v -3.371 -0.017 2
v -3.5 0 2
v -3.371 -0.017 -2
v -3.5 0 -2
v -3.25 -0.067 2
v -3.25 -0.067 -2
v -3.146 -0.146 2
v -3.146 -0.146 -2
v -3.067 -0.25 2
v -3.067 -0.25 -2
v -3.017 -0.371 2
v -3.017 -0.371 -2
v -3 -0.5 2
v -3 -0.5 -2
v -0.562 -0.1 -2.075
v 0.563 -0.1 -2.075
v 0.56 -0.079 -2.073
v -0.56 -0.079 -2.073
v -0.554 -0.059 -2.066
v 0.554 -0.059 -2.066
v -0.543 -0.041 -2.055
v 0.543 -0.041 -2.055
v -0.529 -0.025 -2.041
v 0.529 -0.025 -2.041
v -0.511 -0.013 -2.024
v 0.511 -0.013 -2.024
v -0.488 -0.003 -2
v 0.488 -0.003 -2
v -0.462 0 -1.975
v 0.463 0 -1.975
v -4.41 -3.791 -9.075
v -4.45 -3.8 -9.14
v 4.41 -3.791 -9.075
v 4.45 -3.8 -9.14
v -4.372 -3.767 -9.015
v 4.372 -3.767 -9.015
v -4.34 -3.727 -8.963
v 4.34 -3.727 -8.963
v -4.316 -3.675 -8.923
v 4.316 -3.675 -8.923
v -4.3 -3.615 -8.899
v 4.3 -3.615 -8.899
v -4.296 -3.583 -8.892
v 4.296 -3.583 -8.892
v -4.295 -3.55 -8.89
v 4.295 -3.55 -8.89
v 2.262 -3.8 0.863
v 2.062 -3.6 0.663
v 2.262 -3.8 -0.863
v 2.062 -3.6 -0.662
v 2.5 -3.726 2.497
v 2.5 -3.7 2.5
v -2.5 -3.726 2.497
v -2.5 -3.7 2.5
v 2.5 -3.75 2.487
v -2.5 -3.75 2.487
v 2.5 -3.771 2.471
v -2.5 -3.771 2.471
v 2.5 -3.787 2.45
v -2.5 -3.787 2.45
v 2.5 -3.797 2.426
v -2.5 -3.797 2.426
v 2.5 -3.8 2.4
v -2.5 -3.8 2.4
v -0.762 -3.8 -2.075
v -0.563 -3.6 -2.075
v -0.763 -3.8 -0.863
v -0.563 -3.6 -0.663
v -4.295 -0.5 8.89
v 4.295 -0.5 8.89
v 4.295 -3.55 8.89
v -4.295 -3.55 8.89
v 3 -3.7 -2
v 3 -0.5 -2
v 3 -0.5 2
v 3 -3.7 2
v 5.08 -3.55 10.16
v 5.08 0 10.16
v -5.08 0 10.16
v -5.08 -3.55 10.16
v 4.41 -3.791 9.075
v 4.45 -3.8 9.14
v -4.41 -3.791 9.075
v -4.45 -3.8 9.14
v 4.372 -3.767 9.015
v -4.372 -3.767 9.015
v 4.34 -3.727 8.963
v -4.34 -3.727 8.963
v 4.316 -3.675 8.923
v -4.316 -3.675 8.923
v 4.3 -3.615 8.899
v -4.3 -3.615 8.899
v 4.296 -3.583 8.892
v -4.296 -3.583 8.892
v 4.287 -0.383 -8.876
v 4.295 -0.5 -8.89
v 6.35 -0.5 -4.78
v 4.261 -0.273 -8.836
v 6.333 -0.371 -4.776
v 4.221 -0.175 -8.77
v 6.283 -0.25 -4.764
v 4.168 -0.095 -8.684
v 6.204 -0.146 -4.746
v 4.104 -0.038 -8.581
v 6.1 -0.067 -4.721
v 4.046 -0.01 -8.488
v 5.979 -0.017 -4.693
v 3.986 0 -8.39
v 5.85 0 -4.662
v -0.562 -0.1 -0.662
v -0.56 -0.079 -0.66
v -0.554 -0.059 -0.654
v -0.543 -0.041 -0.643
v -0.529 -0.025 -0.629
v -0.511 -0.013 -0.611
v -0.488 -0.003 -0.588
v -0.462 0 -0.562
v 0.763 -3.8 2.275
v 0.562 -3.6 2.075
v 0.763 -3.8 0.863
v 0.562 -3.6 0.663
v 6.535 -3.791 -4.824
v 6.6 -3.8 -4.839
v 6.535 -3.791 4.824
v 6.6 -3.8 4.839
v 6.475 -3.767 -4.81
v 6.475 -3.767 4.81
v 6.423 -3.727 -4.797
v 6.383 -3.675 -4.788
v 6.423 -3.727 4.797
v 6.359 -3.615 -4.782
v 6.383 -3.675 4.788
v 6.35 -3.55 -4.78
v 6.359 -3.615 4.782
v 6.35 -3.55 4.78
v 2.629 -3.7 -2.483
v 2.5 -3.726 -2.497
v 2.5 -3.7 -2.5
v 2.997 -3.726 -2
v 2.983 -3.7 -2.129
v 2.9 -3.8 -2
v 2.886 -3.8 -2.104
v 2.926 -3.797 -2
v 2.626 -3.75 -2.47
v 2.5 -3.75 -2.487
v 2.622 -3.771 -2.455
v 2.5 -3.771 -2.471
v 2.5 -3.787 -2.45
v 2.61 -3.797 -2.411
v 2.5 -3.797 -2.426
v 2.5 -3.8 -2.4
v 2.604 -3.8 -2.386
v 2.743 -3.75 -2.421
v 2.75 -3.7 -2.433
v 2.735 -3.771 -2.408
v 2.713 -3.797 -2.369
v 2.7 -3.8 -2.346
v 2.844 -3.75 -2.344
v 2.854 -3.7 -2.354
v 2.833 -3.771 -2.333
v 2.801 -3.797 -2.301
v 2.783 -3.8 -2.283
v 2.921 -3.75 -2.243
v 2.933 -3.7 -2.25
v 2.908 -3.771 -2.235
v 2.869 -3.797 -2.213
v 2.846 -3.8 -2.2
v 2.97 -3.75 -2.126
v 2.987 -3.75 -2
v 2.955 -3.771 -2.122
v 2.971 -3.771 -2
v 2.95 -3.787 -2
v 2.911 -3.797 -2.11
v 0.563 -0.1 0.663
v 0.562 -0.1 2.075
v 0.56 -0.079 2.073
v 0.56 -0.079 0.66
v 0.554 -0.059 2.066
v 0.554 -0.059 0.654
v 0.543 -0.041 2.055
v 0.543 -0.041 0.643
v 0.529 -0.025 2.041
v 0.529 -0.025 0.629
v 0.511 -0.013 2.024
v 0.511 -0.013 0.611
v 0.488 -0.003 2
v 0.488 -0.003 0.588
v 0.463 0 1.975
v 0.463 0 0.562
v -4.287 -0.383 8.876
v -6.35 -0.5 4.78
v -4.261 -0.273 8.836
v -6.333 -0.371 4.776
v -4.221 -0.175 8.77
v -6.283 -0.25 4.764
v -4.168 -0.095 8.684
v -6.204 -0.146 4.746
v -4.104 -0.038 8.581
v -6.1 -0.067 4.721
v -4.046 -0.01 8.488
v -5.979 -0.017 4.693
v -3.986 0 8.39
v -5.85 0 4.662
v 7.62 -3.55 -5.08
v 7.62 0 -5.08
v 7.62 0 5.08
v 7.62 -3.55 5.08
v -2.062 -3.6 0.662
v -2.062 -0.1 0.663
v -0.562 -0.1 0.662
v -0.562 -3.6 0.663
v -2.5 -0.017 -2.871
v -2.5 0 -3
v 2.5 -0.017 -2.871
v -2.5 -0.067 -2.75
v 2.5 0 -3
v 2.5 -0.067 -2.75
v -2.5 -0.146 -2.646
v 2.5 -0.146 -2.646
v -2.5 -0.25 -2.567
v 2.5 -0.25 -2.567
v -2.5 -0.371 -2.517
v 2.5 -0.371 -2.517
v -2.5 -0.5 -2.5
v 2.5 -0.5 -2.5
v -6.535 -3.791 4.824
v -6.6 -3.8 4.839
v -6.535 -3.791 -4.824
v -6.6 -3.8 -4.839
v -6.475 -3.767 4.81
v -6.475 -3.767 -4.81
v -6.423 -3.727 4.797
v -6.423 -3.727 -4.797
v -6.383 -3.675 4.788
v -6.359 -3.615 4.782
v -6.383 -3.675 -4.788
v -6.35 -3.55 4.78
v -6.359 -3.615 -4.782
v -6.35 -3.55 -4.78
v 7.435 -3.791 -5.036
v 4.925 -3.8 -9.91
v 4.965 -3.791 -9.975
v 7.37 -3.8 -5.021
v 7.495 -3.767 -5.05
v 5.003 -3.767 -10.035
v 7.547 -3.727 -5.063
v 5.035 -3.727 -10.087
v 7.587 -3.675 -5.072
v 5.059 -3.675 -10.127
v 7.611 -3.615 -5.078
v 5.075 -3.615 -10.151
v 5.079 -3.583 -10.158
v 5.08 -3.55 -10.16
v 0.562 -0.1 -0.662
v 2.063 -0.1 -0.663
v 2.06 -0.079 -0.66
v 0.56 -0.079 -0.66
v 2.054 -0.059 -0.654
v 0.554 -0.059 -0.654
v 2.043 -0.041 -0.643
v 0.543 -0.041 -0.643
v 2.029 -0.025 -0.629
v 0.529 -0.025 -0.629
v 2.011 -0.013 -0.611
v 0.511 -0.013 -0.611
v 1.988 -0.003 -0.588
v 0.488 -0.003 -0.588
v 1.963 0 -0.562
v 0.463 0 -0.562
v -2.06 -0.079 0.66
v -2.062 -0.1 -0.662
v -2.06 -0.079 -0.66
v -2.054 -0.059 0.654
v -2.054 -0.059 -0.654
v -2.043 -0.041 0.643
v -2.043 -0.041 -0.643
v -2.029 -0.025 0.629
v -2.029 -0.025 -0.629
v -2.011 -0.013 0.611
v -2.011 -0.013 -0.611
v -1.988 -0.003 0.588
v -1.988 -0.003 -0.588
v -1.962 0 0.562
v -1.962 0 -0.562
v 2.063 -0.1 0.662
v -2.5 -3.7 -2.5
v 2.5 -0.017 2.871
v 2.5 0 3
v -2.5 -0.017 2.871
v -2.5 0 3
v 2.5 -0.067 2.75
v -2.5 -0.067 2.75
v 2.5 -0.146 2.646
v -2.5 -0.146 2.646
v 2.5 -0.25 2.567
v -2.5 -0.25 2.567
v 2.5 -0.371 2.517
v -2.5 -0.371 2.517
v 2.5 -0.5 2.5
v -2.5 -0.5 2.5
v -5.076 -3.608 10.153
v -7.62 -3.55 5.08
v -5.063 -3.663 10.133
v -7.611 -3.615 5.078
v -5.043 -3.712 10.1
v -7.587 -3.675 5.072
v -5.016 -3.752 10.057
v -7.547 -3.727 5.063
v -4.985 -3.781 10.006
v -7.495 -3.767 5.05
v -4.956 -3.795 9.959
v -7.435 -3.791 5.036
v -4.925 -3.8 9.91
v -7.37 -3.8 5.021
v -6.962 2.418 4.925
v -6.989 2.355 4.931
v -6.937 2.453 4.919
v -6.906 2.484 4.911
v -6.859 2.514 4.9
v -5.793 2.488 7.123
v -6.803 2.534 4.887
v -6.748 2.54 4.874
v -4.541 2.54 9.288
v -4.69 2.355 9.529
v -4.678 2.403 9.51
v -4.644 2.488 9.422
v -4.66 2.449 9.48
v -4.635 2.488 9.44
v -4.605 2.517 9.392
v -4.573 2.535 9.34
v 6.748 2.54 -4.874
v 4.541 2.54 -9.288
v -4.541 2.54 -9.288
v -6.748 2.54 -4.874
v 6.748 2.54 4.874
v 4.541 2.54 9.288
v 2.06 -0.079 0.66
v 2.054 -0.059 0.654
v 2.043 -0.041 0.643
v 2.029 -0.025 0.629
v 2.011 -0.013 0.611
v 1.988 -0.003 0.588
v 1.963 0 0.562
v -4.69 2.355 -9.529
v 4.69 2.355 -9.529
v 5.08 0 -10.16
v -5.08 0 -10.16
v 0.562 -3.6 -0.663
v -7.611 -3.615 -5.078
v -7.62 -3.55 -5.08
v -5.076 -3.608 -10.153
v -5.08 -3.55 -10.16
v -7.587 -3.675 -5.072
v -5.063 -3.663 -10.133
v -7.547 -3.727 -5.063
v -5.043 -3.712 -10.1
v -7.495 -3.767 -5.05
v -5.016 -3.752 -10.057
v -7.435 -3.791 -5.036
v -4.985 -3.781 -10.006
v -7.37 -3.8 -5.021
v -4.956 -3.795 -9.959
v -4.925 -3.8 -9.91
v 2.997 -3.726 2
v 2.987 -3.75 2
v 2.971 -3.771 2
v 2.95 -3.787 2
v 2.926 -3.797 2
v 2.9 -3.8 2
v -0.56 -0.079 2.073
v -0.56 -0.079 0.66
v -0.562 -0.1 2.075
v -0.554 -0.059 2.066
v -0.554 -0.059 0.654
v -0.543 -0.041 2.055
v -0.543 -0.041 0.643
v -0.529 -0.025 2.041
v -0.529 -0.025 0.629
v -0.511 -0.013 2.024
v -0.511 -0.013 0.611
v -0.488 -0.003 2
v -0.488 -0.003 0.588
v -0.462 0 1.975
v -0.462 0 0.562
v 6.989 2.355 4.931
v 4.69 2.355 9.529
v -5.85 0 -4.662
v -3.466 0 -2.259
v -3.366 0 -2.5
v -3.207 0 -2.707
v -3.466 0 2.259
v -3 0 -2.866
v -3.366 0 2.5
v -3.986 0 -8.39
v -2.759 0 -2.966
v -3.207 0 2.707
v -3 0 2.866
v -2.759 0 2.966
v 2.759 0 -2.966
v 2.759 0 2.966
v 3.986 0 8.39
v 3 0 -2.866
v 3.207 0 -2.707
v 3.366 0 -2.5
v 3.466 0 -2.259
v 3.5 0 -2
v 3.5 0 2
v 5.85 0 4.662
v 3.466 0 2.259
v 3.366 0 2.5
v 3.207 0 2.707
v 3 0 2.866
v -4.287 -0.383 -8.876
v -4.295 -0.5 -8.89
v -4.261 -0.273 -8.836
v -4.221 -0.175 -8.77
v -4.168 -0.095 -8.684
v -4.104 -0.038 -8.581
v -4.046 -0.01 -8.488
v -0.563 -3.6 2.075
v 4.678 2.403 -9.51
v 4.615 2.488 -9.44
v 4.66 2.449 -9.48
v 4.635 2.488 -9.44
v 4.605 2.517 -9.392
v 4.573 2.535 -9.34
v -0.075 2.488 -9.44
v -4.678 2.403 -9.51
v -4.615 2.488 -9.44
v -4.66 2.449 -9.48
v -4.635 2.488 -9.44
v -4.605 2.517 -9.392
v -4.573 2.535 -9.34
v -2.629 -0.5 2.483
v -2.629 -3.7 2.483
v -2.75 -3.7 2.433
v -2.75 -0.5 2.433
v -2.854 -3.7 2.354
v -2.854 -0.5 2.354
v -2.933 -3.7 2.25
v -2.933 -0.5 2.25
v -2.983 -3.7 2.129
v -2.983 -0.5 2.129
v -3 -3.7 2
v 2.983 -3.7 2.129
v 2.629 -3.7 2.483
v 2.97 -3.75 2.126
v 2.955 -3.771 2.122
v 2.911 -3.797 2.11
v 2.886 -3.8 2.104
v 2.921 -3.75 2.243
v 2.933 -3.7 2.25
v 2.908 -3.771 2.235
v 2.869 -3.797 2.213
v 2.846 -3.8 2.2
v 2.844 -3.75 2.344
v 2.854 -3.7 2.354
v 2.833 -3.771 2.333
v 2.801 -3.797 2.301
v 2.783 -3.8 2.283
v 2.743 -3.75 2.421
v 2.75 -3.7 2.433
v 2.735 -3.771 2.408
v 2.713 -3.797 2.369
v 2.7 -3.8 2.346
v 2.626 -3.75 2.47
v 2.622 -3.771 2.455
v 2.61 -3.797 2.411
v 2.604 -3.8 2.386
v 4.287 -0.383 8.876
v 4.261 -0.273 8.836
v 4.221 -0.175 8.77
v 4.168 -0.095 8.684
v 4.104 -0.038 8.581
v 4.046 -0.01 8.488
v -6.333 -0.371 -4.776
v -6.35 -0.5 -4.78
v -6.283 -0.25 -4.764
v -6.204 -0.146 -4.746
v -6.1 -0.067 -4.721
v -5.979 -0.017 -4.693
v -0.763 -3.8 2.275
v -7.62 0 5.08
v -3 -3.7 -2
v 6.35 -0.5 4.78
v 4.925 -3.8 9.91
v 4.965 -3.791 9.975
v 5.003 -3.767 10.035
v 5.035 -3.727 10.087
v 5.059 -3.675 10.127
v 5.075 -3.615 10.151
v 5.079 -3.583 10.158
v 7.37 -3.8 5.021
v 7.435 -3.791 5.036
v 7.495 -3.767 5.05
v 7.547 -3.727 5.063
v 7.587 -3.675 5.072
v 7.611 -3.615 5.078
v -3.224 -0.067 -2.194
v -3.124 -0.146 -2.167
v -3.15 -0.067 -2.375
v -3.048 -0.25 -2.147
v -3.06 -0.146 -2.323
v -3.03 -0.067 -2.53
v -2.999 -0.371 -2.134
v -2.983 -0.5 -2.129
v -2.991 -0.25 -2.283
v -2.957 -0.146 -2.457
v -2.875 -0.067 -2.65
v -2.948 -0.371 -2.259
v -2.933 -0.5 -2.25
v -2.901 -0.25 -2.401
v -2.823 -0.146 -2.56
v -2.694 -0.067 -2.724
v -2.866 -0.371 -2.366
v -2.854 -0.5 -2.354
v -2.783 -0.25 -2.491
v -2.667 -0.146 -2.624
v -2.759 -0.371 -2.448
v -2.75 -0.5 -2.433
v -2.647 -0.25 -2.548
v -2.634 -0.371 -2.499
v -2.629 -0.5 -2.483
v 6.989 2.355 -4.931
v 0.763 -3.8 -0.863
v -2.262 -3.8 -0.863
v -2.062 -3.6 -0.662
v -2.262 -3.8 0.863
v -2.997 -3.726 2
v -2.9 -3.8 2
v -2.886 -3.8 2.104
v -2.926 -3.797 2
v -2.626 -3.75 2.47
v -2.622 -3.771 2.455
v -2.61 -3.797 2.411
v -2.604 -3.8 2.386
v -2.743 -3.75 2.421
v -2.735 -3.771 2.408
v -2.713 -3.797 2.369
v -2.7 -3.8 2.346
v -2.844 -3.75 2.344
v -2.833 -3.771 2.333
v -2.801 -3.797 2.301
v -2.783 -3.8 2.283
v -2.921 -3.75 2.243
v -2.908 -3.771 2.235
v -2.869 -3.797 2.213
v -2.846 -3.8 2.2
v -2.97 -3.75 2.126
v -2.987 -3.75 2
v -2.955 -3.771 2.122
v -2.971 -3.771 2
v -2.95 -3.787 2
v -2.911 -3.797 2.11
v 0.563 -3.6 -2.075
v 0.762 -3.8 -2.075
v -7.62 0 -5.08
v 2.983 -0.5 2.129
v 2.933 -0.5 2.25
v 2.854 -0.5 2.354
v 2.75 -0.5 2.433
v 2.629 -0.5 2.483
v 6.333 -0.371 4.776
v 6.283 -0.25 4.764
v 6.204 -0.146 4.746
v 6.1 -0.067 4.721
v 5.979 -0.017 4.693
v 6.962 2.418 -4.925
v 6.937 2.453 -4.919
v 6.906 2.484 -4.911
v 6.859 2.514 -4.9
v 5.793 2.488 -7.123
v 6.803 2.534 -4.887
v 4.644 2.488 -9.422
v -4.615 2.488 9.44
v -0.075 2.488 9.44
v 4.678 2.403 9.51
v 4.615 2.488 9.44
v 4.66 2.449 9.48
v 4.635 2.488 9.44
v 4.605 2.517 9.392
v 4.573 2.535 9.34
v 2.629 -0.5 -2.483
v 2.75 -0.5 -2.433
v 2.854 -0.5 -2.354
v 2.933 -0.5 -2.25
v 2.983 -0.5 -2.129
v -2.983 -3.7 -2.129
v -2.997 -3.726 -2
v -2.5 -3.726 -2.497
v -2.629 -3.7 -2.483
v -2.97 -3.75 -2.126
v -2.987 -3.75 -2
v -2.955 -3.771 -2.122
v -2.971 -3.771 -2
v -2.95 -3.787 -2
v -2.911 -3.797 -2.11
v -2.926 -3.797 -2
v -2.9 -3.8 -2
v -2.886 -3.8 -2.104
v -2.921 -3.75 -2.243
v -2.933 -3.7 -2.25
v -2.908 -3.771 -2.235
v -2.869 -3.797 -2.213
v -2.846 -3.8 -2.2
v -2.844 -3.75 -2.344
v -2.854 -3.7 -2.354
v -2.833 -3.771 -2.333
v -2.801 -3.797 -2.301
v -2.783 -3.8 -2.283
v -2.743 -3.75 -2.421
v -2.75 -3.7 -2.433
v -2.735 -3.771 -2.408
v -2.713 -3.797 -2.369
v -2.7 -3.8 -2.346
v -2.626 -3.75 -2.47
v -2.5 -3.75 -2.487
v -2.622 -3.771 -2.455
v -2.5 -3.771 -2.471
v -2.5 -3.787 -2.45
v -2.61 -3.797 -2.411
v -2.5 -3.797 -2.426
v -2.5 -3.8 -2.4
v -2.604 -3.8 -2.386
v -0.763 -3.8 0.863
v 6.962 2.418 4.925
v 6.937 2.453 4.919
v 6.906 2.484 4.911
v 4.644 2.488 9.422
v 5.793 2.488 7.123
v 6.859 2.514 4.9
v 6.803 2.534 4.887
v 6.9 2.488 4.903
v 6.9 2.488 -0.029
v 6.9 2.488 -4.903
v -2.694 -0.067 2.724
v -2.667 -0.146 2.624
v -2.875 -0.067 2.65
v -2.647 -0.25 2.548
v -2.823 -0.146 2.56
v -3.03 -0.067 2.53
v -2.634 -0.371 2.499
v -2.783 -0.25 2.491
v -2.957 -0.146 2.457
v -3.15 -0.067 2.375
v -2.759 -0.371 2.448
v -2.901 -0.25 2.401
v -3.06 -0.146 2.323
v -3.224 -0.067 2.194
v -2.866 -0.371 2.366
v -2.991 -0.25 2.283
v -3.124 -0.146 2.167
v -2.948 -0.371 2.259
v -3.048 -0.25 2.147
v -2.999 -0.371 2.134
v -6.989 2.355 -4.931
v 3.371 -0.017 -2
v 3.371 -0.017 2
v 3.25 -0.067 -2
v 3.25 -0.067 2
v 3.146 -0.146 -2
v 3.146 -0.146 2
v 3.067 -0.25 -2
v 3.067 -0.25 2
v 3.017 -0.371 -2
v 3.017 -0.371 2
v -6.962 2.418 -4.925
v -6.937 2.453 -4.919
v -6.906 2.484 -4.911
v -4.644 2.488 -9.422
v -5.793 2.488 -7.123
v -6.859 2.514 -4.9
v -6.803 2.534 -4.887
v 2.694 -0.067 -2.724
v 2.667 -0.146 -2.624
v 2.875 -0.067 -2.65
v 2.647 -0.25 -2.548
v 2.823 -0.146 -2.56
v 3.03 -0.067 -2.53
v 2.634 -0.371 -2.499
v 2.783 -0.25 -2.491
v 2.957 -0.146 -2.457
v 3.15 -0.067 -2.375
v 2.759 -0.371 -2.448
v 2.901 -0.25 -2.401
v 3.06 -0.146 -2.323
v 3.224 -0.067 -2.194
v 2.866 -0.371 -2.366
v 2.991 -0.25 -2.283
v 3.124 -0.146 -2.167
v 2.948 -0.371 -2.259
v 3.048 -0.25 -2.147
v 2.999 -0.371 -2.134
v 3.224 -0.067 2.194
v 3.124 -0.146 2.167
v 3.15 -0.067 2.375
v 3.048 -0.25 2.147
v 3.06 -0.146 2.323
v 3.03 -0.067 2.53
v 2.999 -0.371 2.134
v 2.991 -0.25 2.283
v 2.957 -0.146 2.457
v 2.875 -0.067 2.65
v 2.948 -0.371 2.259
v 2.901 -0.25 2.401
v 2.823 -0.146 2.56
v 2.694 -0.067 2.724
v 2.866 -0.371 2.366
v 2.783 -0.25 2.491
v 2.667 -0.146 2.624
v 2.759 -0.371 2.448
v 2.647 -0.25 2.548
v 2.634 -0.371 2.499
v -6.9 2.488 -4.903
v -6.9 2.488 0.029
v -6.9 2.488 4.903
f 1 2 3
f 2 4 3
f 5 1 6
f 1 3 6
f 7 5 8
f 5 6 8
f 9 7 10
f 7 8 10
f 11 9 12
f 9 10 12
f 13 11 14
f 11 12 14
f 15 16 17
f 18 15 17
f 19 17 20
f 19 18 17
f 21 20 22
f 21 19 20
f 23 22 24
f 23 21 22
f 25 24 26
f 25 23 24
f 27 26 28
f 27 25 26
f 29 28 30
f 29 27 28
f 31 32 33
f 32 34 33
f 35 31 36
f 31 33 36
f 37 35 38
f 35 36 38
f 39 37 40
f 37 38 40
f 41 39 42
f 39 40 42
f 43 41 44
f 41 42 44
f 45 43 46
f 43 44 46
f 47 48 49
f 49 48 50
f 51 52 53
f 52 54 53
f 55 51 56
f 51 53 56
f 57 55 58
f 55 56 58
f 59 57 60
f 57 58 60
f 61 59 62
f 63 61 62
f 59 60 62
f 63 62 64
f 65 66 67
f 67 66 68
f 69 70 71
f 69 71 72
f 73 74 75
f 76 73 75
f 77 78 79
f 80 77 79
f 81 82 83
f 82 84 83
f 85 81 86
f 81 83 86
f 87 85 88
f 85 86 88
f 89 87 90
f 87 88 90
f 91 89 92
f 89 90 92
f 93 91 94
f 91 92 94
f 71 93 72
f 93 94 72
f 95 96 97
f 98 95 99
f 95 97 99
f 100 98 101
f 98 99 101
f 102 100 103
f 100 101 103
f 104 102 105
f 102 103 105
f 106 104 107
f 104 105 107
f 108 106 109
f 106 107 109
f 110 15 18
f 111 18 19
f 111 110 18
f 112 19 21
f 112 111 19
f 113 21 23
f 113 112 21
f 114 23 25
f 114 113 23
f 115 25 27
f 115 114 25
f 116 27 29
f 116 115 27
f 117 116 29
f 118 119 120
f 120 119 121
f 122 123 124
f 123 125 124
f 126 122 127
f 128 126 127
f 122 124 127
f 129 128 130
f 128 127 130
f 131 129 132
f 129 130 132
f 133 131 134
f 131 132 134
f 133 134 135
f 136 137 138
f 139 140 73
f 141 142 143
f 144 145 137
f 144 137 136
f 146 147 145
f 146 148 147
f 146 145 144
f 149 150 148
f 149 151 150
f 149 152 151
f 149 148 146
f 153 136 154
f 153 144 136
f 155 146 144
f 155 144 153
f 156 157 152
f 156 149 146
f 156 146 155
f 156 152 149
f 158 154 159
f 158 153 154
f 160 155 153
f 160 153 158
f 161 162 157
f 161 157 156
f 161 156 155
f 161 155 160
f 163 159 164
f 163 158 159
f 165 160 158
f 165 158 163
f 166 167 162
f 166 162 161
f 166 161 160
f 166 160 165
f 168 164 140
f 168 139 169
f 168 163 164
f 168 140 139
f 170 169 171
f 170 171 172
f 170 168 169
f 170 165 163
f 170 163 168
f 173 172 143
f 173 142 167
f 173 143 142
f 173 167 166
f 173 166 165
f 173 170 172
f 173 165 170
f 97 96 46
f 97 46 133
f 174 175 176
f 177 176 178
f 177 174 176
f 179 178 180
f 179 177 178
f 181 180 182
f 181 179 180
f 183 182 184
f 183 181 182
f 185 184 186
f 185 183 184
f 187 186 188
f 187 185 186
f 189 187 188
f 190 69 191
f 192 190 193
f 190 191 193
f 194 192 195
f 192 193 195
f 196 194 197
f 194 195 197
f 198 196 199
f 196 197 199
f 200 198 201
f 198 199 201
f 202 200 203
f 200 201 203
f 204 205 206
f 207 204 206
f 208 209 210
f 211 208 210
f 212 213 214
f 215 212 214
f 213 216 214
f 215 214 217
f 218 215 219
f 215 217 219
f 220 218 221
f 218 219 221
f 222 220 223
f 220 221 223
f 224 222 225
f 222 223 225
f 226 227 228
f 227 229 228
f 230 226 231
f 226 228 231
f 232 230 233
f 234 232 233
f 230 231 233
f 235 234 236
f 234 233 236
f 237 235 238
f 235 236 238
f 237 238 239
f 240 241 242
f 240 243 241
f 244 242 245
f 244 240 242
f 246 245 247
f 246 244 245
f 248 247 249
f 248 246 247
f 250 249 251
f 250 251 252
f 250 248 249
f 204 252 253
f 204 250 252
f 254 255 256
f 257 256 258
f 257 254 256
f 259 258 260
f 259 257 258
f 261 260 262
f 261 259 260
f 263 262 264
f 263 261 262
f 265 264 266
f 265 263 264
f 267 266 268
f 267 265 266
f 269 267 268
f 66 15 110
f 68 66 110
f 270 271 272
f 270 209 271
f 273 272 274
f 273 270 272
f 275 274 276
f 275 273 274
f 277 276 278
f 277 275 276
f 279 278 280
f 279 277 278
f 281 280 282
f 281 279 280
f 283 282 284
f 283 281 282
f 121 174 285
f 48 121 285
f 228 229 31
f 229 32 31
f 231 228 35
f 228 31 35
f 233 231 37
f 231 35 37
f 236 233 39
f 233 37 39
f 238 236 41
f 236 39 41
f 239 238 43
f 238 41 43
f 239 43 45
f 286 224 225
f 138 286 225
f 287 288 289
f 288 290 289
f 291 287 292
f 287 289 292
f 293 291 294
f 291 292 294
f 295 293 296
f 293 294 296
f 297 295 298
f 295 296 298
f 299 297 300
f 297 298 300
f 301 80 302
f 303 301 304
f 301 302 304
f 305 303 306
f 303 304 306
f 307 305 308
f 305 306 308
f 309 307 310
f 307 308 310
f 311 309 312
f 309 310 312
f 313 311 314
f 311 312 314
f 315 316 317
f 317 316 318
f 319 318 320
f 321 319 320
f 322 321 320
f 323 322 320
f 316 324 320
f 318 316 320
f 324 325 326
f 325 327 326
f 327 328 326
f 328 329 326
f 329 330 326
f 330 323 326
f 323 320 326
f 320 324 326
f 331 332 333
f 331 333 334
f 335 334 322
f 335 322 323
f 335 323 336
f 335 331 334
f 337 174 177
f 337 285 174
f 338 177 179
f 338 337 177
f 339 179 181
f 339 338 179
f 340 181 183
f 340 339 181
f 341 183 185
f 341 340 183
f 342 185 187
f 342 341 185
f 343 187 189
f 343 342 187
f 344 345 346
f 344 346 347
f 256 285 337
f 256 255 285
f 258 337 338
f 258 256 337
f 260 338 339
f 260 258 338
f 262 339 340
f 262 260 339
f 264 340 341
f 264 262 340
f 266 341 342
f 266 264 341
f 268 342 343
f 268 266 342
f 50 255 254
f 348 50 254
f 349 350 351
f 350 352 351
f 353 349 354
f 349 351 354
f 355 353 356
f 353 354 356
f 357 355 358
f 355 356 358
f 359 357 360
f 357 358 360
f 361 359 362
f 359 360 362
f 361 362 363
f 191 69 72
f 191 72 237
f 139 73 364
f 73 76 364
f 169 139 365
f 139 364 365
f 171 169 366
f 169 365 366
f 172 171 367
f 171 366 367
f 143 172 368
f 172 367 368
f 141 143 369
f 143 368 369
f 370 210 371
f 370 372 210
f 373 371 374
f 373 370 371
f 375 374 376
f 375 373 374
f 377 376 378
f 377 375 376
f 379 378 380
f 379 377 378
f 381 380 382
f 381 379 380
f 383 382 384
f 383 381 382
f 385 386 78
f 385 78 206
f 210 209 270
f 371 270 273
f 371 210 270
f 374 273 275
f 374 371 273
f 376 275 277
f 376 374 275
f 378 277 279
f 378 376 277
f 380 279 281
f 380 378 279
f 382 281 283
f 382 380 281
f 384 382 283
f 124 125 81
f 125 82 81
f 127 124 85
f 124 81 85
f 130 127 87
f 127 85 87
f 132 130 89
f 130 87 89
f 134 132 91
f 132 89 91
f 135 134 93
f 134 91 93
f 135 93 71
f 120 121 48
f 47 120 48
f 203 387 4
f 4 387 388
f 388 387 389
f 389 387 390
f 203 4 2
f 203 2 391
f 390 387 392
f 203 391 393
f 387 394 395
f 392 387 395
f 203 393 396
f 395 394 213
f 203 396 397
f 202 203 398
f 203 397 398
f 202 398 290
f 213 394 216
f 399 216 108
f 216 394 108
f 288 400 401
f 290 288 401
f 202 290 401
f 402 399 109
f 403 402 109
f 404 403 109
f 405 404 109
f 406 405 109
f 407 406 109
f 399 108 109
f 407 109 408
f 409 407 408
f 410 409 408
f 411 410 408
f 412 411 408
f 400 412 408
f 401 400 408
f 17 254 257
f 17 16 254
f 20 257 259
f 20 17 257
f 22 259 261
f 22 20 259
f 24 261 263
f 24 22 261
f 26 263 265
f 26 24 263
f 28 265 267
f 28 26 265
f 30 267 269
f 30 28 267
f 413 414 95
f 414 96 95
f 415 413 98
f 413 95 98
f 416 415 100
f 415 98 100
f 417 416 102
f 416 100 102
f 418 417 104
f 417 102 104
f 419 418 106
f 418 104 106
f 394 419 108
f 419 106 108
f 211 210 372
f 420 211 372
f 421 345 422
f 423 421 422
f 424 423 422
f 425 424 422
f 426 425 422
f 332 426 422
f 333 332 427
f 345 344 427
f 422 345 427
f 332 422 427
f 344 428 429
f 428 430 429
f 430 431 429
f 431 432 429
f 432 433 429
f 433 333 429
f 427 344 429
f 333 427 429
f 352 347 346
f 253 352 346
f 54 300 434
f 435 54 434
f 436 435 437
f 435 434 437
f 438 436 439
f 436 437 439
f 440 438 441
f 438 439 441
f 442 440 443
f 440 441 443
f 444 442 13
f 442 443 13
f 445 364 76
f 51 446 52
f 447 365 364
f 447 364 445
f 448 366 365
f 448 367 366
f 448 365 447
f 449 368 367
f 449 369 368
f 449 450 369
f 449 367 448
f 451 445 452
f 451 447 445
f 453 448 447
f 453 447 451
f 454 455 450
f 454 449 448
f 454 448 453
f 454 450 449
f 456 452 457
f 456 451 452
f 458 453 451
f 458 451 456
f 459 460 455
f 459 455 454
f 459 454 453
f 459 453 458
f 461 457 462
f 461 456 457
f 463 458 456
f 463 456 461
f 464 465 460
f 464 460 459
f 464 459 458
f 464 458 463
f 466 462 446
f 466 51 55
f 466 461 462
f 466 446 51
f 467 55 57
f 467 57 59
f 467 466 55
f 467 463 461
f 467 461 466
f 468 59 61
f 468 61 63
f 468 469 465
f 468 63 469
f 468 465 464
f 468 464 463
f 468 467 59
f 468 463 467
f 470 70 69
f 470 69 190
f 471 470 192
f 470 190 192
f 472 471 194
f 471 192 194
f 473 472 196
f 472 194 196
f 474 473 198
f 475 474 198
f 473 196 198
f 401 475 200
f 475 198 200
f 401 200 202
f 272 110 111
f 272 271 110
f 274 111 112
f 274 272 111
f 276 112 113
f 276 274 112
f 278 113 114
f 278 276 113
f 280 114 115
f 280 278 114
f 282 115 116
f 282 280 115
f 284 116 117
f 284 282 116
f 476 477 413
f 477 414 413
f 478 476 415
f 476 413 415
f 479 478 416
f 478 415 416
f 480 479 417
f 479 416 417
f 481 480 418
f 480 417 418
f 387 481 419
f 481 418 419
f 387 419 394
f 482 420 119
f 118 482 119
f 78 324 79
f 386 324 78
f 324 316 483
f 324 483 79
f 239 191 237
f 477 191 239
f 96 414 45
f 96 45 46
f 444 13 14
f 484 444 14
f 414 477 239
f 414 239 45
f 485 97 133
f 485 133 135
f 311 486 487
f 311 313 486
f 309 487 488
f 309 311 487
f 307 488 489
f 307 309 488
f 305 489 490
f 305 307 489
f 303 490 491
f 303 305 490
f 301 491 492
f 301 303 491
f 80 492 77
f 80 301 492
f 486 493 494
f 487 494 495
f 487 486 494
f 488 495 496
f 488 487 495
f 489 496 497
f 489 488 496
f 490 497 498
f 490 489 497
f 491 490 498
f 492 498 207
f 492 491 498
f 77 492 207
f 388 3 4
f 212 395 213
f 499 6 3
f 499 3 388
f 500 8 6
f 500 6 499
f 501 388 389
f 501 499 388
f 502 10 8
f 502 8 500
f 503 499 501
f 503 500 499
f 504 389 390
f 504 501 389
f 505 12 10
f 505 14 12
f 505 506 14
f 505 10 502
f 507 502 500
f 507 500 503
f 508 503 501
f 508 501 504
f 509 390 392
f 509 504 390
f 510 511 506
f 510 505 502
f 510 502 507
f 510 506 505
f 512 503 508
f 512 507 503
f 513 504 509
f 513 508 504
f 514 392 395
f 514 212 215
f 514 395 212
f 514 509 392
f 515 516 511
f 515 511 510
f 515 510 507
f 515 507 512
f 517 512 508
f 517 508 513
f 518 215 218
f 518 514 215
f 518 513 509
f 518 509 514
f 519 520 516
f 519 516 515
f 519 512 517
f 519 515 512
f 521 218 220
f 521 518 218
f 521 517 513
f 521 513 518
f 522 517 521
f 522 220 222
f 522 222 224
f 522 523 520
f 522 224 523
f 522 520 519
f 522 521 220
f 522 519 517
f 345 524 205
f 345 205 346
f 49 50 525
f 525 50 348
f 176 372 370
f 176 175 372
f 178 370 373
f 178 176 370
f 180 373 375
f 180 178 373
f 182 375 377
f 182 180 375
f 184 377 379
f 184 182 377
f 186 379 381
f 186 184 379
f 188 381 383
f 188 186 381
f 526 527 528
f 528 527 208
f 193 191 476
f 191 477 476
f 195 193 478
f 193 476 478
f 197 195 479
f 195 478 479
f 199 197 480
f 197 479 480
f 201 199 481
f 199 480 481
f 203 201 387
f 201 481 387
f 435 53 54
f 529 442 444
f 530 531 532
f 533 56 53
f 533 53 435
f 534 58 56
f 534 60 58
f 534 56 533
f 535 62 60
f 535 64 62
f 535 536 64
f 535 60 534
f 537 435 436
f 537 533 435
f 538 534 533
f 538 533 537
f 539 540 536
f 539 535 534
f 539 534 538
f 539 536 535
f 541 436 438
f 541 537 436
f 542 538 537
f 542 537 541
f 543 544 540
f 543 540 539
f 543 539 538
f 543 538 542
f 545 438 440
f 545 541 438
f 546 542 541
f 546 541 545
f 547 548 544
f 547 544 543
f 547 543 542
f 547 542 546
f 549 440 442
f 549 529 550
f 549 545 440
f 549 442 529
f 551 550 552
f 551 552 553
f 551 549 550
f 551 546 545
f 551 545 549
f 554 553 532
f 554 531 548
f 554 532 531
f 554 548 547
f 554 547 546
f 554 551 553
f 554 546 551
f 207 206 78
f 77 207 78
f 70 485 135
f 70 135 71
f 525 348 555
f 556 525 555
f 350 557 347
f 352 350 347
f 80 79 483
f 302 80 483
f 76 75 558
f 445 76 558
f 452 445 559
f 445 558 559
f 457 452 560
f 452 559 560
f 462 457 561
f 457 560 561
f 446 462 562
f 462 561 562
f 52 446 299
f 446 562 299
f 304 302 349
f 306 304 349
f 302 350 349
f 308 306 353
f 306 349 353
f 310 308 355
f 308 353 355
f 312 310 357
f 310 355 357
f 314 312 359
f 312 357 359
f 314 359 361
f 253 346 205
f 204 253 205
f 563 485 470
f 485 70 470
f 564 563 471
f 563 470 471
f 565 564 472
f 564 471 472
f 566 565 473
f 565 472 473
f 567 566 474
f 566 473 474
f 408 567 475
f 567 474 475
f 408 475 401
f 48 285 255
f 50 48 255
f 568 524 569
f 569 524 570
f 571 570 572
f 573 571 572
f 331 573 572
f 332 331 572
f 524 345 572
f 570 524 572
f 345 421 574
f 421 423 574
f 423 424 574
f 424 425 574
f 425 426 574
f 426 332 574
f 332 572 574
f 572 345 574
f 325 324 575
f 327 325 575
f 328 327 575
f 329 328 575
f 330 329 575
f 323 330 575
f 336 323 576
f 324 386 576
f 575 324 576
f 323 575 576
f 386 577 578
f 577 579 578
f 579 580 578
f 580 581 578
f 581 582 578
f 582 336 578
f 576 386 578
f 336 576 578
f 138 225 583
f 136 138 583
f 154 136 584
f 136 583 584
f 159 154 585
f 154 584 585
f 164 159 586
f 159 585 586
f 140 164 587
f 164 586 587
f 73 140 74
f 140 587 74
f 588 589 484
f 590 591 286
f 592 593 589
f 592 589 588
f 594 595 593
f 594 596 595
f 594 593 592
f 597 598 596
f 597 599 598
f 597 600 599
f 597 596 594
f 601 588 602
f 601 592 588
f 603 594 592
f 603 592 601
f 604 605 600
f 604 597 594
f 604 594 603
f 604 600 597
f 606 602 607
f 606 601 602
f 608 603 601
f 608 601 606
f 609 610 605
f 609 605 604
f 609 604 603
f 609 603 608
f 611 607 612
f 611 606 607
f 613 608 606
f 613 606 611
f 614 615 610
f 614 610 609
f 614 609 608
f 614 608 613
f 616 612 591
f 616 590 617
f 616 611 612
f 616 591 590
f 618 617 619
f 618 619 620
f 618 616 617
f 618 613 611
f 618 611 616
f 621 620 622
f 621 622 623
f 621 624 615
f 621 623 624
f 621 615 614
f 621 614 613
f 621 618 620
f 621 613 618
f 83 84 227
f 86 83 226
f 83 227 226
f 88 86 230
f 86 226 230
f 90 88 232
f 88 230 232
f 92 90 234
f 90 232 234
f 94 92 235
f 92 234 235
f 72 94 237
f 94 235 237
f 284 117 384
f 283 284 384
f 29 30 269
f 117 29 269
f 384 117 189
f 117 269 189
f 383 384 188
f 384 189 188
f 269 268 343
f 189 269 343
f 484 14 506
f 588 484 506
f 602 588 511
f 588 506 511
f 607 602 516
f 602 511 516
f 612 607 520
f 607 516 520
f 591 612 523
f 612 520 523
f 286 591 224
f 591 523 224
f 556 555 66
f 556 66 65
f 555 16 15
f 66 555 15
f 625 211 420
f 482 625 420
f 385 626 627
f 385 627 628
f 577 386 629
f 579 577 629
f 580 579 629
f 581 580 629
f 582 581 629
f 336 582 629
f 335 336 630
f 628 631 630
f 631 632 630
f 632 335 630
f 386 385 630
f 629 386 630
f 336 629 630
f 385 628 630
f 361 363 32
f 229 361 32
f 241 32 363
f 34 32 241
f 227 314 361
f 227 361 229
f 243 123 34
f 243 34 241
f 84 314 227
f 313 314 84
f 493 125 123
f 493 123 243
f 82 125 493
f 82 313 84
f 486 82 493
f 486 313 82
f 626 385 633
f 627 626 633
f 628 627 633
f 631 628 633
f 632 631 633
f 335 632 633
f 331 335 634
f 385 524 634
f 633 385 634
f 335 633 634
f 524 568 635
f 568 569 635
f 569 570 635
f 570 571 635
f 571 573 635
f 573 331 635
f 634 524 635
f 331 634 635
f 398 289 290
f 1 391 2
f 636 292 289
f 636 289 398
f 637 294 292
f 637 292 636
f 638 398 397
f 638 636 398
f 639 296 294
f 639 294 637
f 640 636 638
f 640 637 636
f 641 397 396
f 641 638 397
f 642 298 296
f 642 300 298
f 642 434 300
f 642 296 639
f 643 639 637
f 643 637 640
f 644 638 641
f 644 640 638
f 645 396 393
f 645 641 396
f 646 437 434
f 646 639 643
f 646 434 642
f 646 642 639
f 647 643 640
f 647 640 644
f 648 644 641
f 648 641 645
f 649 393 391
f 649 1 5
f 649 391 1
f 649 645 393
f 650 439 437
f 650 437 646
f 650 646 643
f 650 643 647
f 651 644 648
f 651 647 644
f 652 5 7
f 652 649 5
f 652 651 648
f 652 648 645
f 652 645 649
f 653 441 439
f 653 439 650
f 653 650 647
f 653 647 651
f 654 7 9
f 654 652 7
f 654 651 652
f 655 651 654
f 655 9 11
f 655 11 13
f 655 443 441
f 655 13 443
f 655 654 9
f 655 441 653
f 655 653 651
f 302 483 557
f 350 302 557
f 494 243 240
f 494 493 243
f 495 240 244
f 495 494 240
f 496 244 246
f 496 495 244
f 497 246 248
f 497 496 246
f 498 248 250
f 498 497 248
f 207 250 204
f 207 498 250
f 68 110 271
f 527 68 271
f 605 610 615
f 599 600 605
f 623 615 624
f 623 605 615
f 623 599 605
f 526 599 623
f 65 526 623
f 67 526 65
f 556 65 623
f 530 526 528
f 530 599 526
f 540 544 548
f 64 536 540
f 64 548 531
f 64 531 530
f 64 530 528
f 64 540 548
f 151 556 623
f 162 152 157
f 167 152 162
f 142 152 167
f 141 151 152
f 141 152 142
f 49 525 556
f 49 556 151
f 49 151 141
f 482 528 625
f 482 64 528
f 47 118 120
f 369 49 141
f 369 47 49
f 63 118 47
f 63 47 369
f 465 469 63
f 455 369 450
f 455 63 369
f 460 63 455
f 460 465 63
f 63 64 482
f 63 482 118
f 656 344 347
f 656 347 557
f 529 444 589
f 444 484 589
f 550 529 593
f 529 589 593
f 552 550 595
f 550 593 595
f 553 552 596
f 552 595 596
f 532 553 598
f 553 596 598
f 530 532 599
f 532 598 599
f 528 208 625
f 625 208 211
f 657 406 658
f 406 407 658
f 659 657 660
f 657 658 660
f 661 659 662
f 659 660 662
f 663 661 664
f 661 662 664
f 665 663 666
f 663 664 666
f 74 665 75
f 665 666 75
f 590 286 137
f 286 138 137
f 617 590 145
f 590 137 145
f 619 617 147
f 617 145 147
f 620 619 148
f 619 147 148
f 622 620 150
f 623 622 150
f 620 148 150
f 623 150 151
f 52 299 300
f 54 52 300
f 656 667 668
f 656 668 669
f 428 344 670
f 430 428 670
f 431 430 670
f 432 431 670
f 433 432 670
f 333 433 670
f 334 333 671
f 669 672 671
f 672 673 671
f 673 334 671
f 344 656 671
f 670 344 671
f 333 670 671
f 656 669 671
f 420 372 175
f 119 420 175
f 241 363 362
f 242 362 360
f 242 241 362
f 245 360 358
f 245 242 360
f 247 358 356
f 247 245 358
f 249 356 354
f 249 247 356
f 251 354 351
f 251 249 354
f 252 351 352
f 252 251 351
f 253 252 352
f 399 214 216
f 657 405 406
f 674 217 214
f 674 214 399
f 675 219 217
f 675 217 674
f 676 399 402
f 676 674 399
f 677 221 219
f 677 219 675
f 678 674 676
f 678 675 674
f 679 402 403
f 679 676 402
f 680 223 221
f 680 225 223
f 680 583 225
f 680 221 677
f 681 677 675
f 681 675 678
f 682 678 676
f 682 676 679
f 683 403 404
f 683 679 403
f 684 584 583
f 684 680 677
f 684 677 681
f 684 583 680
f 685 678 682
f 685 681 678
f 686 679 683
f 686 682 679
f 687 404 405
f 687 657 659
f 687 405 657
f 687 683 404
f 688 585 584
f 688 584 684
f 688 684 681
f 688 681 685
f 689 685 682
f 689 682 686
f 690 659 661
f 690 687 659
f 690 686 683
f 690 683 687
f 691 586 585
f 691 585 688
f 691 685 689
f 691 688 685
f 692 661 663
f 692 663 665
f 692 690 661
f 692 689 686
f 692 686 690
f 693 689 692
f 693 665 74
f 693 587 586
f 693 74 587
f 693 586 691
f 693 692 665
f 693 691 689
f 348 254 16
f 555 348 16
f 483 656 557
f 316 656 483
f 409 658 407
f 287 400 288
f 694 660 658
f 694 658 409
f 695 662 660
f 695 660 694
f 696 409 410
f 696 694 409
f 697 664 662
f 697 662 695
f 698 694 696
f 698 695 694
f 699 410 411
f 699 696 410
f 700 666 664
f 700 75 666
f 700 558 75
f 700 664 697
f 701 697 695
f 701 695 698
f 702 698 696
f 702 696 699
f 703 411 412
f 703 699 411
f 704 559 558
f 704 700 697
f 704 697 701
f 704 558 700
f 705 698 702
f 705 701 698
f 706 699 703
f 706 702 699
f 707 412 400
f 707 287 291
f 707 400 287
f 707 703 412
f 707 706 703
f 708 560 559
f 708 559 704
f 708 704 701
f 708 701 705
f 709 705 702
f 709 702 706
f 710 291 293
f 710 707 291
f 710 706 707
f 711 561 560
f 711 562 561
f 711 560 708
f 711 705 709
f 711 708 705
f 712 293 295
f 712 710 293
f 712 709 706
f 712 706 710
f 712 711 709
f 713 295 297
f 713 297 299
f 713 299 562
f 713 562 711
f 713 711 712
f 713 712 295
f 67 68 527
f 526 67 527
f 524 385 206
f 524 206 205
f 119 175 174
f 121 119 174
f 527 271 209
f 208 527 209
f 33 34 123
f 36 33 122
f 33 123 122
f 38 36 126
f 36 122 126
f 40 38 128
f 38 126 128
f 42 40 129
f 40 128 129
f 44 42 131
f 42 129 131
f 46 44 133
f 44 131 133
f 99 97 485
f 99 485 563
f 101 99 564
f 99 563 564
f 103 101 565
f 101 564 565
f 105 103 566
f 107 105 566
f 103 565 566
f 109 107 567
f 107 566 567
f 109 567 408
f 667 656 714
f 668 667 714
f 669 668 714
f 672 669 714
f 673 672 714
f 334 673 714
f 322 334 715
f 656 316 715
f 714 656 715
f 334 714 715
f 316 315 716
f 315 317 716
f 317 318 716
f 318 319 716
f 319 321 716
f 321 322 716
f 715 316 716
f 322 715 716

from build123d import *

# Parameters (mm, degrees)
BOSS_EXTRUDE1_DEPTH = 2.54
BOSS_EXTRUDE1_TAPER = 15
BOSS_EXTRUDE2_DEPTH = 3.8
FILLET2_R           = 0.1
CHAMFER1_SIZE       = 0.2
BOSS_EXTRUDE3_DEPTH = 3.8
FILLET3_R           = 0.25
FILLET5_R           = 0.5
FILLET6_R           = 0.1
FILLET7_R           = 0.25


with BuildPart() as part:
    # Sketch1 → Boss-Extrude1 (new body)
    with BuildSketch(Plane(origin=(0, 0, 0), x_dir=(1, 0, 0), z_dir=(0, 1, 0))):
        Polygon((-7.62, 5.08), (-7.62, -5.08), (-5.08, -10.16), (5.08, -10.16), (7.62, -5.08), (7.62, 5.08), (5.08, 10.16), (-5.08, 10.16), align=None)
    extrude(amount=BOSS_EXTRUDE1_DEPTH, taper=BOSS_EXTRUDE1_TAPER)

    # Stem → Boss-Extrude2 (add)
    with BuildSketch(Plane.XZ):
        with BuildLine():
            Line((2.499999969, 2.5), (-2.499999969, 2.5))
            ThreePointArc((-2.499999969, 2.5), (-2.85355336, 2.353553391), (-2.999999969, 2))
            Line((-2.999999969, 2), (-2.999999969, -2))
            ThreePointArc((-2.999999969, -2), (-2.85355336, -2.353553391), (-2.499999969, -2.5))
            Line((-2.499999969, -2.5), (2.499999969, -2.5))
            ThreePointArc((2.499999969, -2.5), (2.85355336, -2.353553391), (2.999999969, -2))
            Line((2.999999969, -2), (2.999999969, 2))
            ThreePointArc((2.999999969, 2), (2.85355336, 2.353553391), (2.499999969, 2.5))
        make_face()
        Polygon((-0.5625, 0.6625), (-0.5625, 2.075), (0.5625, 2.075), (0.5625, 0.6625), (2.0625, 0.6625), (2.0625, -0.6625), (0.5625, -0.6625), (0.5625, -2.075), (-0.5625, -2.075), (-0.5625, -0.6625), (-2.0625, -0.6625), (-2.0625, 0.6625), align=None, mode=Mode.SUBTRACT)
    extrude(amount=BOSS_EXTRUDE2_DEPTH)

    # Fillet2
    fillet2_edges = [part.edges().sort_by_distance(p)[0] for p in [
        (2.85355336, -3.8, 2.353553391),
        (0, -3.8, 2.5),
        (2.999999969, -3.8, 0),
        (-2.85355336, -3.8, 2.353553391),
        (-2.999999969, -3.8, 0),
        (-2.85355336, -3.8, -2.353553391),
        (0, -3.8, -2.5),
        (2.85355336, -3.8, -2.353553391),
    ]]
    fillet(fillet2_edges, radius=FILLET2_R)

    # Chamfer1
    chamfer1_edges = [part.edges().sort_by_distance(p)[0] for p in [
        (-2.0625, -3.8, 0),
        (-1.3125, -3.8, 0.6625),
        (-0.5625, -3.8, 1.36875),
        (1.3125, -3.8, 0.6625),
        (-0.5625, -3.8, -1.36875),
        (0, -3.8, 2.075),
        (0.5625, -3.8, 1.36875),
        (2.0625, -3.8, 0),
        (1.3125, -3.8, -0.6625),
        (0.5625, -3.8, -1.36875),
        (-1.3125, -3.8, -0.6625),
    ]]
    chamfer(chamfer1_edges, length=CHAMFER1_SIZE)

    # Sketch3 → Boss-Extrude3 (add)
    with BuildSketch(Plane.XZ):
        Polygon((-7.62, 5.08), (-7.62, -5.08), (-5.08, -10.16), (5.08, -10.16), (7.62, -5.08), (7.62, 5.08), (5.08, 10.16), (-5.08, 10.16), align=None)
        Polygon((-6.35, -4.780193669), (-4.295096834, -8.89), (4.295096834, -8.89), (6.35, -4.780193669), (6.35, 4.780193669), (4.295096834, 8.89), (-4.295096834, 8.89), (-6.35, 4.780193669), align=None, mode=Mode.SUBTRACT)
    extrude(amount=BOSS_EXTRUDE3_DEPTH)

    # Fillet3
    fillet3_edges = [part.edges().sort_by_distance(p)[0] for p in [
        (-6.35, -3.8, 7.62),
        (-7.62, -3.8, 0),
        (-6.35, -3.8, -7.62),
        (0, -3.8, -10.16),
        (6.35, -3.8, -7.62),
        (7.62, -3.8, 0),
        (6.35, -3.8, 7.62),
        (0, -3.8, 10.16),
        (-6.35, -3.8, 0),
        (-5.322548417, -3.8, -6.835096834),
        (0, -3.8, -8.89),
        (5.322548417, -3.8, -6.835096834),
        (6.35, -3.8, 0),
        (5.322548417, -3.8, 6.835096834),
        (0, -3.8, 8.89),
        (-5.322548417, -3.8, 6.835096834),
    ]]
    fillet(fillet3_edges, radius=FILLET3_R)

    # Fillet5
    fillet5_edges = [part.edges().sort_by_distance(p)[0] for p in [
        (-6.35, 0, 0),
        (-5.322548417, 0, -6.835096834),
        (0, 0, -8.89),
        (5.322548417, 0, -6.835096834),
        (6.35, 0, 0),
        (5.322548417, 0, 6.835096834),
        (0, 0, 8.89),
        (-5.322548417, 0, 6.835096834),
        (-2.85355336, 0, 2.353553391),
        (-2.999999969, 0, 0),
        (-2.85355336, 0, -2.353553391),
        (0, 0, -2.5),
        (2.85355336, 0, -2.353553391),
        (2.85355336, 0, 2.353553391),
        (2.999999969, 0, 0),
        (0, 0, 2.5),
    ]]
    fillet(fillet5_edges, radius=FILLET5_R)

    # Fillet6
    fillet6_edges = [part.edges().sort_by_distance(p)[0] for p in [
        (0, 0, 2.075),
        (0.5625, 0, 1.36875),
        (2.0625, 0, 0),
        (1.3125, 0, -0.6625),
        (0.5625, 0, -1.36875),
        (-1.3125, 0, -0.6625),
        (-2.0625, 0, 0),
        (-0.5625, 0, -1.36875),
        (0, 0, -2.075),
        (1.3125, 0, 0.6625),
        (-0.5625, 0, 1.36875),
        (-1.3125, 0, 0.6625),
    ]]
    fillet(fillet6_edges, radius=FILLET6_R)

    # Fillet7
    fillet7_edges = [part.edges().sort_by_distance(p)[0] for p in [
        (-6.939409051, 2.54, 0),
        (-5.799390356, 2.54, 7.199371661),
        (0, 2.54, 9.479409051),
        (5.799390356, 2.54, 7.199371661),
        (6.939409051, 2.54, 0),
        (5.799390356, 2.54, -7.199371661),
        (0, 2.54, -9.479409051),
        (-5.799390356, 2.54, -7.199371661),
    ]]
    fillet(fillet7_edges, radius=FILLET7_R)


solid = part.part
